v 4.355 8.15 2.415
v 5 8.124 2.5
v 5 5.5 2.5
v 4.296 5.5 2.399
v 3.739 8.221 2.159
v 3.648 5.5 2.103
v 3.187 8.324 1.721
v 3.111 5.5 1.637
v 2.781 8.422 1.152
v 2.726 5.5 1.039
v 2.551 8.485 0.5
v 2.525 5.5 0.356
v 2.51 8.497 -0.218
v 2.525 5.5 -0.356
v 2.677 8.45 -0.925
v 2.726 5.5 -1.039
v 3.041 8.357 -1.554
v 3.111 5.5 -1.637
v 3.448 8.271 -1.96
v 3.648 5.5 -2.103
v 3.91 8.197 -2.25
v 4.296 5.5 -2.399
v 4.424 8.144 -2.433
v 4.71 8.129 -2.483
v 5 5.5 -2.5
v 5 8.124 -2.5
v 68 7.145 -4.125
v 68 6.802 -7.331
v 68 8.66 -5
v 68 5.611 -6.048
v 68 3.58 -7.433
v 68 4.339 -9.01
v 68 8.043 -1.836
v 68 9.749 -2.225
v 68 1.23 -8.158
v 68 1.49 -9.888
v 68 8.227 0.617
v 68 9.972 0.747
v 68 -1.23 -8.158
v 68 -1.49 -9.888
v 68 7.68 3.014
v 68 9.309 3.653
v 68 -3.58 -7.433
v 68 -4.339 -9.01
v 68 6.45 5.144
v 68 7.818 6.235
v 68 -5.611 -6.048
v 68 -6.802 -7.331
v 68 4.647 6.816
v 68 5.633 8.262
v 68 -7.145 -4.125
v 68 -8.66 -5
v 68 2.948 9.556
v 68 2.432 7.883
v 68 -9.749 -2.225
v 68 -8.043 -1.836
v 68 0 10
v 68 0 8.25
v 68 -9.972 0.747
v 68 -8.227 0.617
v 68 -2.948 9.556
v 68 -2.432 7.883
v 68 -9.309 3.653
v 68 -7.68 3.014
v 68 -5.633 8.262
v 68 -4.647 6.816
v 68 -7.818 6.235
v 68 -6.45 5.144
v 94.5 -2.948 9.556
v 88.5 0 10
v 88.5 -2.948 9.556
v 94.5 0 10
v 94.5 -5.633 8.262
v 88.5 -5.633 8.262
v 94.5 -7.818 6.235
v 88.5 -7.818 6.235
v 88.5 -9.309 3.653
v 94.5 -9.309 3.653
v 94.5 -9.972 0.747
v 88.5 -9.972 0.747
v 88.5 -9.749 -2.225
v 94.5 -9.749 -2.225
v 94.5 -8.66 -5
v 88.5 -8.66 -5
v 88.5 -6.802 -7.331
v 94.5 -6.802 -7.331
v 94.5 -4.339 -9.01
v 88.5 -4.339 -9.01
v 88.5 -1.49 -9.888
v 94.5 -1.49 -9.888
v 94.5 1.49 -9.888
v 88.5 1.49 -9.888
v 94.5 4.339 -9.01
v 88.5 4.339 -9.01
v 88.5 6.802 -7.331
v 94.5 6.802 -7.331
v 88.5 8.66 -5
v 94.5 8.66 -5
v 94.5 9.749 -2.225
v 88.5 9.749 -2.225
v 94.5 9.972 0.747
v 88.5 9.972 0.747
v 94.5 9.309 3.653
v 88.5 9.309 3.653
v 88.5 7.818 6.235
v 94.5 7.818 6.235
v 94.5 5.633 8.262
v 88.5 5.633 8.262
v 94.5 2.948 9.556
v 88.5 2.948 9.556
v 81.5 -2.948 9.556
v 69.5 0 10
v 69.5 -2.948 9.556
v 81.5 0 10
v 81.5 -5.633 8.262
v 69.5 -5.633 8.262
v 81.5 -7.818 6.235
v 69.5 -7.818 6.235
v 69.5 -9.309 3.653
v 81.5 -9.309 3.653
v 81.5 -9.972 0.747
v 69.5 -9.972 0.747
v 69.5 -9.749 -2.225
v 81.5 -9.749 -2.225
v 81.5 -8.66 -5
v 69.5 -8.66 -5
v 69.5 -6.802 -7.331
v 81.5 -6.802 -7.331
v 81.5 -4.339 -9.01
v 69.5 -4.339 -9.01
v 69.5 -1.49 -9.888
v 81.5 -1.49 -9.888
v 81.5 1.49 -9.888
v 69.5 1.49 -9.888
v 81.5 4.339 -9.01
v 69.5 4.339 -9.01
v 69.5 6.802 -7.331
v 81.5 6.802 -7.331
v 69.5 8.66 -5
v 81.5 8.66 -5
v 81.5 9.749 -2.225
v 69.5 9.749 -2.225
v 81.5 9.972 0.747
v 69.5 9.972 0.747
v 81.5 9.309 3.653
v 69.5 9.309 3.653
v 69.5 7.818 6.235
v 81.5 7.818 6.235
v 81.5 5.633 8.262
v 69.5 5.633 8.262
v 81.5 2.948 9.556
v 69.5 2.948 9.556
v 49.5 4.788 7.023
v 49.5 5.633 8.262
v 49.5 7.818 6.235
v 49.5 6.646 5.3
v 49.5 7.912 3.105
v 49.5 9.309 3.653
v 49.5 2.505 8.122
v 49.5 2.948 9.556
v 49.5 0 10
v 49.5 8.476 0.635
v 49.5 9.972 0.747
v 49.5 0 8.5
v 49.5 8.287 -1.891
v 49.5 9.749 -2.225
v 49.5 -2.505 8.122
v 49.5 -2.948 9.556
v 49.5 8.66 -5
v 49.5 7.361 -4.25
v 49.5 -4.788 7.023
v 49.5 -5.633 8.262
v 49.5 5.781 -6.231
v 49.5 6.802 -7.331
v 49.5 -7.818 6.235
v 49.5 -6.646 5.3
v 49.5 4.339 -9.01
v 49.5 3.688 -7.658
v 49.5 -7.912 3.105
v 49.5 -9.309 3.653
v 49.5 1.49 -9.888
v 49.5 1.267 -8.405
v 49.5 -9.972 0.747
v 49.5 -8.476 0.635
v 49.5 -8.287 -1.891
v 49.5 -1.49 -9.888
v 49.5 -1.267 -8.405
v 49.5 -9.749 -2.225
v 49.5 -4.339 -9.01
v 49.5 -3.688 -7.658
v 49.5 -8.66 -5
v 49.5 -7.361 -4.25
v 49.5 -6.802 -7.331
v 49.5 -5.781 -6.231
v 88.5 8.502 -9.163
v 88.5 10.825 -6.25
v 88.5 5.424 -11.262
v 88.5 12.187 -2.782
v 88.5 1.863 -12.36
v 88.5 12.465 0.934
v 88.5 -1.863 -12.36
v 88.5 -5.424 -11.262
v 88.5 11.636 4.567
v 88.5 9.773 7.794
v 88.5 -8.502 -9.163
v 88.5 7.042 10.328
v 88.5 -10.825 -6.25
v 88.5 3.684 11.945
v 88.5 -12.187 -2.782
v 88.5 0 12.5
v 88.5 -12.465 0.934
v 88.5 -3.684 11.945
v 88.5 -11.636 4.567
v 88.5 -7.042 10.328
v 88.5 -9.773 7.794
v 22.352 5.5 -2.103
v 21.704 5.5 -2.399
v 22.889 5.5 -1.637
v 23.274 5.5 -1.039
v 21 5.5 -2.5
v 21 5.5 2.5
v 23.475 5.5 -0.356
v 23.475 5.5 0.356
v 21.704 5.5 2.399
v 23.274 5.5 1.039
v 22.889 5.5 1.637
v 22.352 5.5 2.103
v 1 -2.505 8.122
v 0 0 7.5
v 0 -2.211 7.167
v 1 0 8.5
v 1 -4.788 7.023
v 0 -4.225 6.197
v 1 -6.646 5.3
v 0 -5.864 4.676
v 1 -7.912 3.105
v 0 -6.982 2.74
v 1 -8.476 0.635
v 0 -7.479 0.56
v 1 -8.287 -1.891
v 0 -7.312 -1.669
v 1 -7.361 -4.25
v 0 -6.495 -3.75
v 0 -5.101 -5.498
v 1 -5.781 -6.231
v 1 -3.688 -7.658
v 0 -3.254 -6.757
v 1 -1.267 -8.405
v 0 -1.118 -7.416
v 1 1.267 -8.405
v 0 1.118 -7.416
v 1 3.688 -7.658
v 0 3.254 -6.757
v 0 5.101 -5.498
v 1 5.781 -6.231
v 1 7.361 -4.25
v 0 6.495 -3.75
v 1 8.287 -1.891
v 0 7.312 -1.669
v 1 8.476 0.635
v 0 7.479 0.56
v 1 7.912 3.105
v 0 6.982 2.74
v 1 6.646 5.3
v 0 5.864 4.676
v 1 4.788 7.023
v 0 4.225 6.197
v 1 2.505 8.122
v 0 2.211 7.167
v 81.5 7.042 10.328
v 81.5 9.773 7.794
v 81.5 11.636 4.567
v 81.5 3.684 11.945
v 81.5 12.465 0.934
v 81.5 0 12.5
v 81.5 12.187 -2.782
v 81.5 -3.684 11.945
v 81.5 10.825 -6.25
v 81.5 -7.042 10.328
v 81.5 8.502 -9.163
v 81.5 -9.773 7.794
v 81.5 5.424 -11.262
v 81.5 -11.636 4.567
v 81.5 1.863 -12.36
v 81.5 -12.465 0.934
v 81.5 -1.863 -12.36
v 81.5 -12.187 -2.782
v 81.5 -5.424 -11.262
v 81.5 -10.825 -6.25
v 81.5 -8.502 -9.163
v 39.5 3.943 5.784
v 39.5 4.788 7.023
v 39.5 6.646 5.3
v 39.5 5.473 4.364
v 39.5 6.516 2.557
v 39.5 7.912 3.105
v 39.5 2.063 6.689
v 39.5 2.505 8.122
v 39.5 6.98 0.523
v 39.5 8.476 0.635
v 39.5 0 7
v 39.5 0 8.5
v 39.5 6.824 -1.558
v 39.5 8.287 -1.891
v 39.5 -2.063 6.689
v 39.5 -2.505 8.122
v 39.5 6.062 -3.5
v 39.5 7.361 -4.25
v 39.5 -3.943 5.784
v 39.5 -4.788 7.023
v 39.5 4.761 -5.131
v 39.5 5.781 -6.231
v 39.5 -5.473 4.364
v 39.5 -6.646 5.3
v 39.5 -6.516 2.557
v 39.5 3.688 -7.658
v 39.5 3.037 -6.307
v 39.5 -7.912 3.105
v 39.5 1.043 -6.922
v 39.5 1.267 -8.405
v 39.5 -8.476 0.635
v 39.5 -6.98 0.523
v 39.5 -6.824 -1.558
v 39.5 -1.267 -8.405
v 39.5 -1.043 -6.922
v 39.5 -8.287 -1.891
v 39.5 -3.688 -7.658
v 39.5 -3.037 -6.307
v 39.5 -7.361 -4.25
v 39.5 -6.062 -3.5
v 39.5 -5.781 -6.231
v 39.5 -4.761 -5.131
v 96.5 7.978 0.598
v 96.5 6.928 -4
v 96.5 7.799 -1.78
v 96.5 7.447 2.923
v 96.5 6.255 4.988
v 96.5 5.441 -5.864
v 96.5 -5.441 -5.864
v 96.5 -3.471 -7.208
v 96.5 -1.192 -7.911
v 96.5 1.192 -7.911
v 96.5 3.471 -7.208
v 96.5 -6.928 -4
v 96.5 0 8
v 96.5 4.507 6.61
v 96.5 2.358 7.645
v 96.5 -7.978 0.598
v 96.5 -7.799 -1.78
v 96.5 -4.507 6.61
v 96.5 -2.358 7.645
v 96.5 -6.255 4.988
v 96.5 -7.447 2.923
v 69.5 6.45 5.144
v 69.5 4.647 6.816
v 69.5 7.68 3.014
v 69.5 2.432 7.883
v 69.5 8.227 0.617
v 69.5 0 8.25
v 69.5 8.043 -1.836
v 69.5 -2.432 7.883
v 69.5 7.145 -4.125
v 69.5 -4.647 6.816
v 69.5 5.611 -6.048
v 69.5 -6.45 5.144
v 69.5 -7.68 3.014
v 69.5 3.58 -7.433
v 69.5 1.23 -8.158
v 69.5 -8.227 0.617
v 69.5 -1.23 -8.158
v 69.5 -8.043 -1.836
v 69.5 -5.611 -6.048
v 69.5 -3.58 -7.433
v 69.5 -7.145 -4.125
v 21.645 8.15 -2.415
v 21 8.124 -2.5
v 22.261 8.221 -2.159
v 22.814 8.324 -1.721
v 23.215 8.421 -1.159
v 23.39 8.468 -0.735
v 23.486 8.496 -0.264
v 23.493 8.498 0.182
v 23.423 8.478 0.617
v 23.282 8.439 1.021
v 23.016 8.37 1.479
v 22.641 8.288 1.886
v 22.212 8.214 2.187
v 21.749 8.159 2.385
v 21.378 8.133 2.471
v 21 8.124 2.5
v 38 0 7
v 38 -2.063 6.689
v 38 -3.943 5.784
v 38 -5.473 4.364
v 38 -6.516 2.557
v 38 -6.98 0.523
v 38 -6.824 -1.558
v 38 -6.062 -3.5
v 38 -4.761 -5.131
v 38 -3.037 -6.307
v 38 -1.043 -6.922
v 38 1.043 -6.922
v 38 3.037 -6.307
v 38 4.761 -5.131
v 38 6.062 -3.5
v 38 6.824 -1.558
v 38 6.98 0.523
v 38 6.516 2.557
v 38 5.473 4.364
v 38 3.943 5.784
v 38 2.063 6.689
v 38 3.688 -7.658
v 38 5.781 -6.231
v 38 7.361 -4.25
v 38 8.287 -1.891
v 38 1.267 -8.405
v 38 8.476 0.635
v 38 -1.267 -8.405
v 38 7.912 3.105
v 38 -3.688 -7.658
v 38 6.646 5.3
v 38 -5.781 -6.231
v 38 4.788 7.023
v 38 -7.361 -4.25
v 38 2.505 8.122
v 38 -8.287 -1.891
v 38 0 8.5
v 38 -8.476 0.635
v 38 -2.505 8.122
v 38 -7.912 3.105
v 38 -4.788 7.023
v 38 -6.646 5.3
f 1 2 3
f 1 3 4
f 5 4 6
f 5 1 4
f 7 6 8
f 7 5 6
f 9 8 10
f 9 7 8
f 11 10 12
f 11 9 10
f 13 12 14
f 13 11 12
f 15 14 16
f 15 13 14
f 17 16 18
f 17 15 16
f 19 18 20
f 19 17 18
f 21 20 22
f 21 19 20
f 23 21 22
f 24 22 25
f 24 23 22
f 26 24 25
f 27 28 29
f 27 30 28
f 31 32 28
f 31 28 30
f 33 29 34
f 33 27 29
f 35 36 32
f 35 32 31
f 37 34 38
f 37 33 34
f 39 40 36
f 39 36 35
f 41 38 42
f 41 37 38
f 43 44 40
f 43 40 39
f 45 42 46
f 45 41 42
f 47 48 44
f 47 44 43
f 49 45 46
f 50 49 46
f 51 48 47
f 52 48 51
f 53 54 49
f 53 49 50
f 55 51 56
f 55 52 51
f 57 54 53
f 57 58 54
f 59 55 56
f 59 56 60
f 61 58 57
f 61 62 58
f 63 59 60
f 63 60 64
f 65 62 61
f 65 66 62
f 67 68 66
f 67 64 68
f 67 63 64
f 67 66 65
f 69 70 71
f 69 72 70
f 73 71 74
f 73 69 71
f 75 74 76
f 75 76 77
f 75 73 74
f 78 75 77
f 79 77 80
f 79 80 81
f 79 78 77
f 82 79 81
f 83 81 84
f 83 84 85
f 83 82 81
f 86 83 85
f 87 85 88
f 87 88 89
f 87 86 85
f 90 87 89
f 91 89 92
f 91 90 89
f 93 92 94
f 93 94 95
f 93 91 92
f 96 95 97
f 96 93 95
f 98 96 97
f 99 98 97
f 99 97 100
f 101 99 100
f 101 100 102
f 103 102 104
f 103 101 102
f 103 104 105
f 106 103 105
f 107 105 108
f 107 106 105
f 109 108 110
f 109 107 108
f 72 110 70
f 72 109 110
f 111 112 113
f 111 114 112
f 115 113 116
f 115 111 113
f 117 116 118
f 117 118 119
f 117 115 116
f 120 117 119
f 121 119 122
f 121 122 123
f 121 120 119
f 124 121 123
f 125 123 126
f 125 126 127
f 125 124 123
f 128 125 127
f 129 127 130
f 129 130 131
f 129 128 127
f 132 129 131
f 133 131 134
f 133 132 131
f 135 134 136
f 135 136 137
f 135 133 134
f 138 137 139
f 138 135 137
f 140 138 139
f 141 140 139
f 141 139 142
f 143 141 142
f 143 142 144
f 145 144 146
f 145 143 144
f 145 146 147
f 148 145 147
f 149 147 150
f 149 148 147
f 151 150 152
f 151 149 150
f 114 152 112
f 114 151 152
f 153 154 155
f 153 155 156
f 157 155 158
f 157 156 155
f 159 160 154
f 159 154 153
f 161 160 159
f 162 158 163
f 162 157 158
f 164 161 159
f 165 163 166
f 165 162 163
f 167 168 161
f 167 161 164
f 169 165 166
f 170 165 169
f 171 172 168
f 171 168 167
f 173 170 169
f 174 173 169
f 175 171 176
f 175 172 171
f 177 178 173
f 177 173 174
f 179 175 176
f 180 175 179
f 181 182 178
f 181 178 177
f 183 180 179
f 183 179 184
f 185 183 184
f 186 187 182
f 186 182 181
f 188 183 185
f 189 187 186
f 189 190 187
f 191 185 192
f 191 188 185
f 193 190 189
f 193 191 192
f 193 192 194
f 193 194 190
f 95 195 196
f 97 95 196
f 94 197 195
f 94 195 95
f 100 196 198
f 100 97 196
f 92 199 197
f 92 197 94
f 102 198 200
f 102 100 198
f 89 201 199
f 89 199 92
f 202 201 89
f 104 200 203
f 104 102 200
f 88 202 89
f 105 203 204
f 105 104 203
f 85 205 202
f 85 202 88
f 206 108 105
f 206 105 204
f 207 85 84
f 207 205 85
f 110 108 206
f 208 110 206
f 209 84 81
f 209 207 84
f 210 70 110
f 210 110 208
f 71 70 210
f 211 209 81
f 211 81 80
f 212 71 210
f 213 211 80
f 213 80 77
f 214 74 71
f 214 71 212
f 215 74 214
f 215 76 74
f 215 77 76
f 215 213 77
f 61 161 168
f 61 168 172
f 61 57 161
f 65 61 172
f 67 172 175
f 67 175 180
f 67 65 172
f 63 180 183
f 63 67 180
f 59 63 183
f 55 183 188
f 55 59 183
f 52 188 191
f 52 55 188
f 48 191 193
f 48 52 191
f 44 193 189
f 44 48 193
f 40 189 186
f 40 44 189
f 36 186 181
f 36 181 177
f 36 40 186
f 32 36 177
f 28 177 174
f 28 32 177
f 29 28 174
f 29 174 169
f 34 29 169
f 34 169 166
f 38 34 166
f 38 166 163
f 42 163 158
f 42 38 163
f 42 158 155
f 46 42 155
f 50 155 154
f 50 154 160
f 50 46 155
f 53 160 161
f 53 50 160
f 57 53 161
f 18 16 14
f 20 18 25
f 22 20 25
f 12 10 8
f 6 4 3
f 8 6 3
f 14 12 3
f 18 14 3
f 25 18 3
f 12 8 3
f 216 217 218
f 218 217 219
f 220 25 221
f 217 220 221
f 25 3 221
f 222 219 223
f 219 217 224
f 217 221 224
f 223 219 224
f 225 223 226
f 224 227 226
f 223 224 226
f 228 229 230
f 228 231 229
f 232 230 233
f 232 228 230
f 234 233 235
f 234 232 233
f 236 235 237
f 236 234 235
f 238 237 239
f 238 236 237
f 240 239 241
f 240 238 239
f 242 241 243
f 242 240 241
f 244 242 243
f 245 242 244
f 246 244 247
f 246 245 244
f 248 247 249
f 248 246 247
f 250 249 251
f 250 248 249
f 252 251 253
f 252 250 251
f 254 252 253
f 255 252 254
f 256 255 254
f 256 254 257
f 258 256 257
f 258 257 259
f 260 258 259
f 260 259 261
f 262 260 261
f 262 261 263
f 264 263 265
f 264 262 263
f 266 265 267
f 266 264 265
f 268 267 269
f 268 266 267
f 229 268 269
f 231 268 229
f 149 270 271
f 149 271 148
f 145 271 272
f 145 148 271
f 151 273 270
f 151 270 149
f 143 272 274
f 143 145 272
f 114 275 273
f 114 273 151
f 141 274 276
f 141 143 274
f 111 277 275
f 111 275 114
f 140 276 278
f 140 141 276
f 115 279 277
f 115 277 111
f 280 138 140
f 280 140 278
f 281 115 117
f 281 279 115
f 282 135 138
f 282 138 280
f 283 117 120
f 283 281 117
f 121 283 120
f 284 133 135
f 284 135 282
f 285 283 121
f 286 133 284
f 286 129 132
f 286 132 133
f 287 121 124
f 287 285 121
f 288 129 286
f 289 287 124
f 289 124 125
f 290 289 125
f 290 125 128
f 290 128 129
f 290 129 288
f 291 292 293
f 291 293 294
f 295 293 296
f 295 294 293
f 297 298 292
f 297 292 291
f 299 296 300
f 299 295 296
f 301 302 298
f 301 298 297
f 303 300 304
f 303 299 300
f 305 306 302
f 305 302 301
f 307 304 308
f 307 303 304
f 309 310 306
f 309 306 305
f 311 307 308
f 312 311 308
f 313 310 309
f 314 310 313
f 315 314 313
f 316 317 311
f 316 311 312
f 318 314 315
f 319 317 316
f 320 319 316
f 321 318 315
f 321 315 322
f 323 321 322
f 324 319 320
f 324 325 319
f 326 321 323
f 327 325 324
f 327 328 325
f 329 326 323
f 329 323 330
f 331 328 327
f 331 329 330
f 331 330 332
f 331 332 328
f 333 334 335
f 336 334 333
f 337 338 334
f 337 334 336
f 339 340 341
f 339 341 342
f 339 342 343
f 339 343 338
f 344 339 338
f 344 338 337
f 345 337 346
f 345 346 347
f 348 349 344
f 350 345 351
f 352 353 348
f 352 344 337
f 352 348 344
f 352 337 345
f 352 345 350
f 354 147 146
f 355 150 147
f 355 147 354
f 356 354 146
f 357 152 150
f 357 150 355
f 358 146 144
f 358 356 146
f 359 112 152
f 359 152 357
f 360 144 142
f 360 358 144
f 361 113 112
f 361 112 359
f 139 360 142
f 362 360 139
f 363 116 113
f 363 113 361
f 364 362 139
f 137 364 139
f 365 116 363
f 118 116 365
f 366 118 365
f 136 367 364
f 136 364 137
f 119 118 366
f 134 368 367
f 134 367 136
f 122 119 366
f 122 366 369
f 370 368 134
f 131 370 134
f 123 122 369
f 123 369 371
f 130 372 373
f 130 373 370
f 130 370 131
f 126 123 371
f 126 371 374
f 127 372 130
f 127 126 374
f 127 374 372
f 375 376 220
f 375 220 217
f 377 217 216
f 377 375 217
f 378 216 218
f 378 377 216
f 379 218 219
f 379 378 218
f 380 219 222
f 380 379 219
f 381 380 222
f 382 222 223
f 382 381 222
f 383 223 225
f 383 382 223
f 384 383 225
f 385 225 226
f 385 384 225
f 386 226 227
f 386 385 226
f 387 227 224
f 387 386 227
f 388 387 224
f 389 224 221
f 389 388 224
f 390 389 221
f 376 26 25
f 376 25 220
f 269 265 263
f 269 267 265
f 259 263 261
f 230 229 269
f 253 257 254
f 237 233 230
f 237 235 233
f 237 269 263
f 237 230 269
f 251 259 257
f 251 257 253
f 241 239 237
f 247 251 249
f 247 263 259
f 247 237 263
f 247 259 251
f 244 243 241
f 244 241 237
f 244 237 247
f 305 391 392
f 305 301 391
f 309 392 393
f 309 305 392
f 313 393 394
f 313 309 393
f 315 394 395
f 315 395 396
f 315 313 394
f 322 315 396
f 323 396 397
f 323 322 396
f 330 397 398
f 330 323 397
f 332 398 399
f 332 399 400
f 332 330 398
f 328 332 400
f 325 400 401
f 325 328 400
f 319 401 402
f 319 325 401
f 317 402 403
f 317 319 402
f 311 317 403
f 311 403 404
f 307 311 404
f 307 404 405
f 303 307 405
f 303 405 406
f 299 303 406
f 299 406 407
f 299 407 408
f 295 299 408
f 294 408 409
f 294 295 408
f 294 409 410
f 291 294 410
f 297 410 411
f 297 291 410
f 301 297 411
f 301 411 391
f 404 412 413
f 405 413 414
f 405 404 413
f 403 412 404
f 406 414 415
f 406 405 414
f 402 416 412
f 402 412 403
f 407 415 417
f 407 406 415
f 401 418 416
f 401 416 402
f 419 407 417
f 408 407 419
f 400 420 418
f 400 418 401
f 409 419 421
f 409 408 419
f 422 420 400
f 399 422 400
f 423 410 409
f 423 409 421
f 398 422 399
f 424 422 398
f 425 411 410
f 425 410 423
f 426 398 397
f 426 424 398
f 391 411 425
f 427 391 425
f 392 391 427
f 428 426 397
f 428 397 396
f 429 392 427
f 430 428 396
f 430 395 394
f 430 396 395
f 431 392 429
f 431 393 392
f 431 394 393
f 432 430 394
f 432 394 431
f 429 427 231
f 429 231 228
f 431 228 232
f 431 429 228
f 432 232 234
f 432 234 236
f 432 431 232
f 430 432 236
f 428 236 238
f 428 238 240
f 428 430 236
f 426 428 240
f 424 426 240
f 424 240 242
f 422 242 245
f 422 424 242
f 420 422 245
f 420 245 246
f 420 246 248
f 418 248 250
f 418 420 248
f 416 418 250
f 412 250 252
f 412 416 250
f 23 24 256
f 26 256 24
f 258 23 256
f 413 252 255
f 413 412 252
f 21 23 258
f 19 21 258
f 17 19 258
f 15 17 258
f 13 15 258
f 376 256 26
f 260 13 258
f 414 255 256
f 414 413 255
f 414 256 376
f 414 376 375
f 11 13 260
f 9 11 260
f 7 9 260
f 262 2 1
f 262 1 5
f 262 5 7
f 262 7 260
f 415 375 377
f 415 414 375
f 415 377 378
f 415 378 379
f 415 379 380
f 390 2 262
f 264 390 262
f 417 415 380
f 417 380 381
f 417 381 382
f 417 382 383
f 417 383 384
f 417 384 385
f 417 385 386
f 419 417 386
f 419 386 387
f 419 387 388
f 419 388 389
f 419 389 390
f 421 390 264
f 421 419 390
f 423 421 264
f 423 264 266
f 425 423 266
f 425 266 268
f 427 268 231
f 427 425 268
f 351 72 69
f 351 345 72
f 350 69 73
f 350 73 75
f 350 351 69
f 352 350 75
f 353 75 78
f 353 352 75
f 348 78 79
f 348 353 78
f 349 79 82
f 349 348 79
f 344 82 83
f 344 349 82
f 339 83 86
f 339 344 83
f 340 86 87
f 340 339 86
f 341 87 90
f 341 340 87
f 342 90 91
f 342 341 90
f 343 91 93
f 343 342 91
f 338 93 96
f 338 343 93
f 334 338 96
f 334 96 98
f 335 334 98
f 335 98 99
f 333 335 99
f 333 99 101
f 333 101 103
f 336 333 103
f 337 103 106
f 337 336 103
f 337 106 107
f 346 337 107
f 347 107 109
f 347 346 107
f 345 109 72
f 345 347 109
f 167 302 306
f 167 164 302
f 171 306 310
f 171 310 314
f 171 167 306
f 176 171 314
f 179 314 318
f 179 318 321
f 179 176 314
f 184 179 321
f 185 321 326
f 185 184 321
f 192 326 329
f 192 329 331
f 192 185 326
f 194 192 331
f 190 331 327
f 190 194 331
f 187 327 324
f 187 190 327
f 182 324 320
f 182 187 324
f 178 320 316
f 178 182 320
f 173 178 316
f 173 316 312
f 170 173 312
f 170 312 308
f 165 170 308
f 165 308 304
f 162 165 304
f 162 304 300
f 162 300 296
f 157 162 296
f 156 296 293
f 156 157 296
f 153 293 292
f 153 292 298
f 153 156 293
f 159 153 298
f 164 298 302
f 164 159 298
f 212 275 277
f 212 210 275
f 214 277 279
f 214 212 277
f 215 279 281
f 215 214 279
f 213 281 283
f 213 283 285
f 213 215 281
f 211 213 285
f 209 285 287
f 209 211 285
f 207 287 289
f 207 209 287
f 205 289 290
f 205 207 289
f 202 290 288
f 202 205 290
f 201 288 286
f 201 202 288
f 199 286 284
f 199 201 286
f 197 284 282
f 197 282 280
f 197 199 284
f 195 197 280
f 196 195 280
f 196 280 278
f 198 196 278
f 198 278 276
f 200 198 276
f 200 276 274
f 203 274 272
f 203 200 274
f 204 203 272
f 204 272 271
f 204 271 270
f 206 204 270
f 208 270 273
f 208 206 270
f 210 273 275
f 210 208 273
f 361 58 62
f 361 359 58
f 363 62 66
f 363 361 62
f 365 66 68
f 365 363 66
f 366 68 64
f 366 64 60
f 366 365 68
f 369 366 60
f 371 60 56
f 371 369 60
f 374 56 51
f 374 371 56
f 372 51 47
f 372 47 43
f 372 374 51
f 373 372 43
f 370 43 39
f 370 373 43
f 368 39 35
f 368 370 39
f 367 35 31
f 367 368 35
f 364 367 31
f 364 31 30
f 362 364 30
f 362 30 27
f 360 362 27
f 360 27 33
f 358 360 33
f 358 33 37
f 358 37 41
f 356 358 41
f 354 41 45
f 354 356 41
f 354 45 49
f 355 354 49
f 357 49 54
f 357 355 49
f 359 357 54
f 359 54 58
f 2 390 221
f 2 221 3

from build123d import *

# Parameters (mm, degrees)
ENL_V_MAT_EXTRU_1_DEPTH = 4.5


with BuildPart() as part:
    # Esquisse1 → Base-Révolution (revolve)
    with BuildSketch(Plane.XY, mode=Mode.PRIVATE) as base_r_volution_sk:
        Polygon((0, 0), (0, 7.5), (1, 8.5), (38, 8.5), (38, 7), (39.5, 7), (39.5, 8.5), (49.5, 8.5), (49.5, 10), (68, 10), (68, 8.25), (69.5, 8.25), (69.5, 10), (81.5, 10), (81.5, 12.5), (88.5, 12.5), (88.5, 10), (94.5, 10), (96.5, 8), (96.5, 0), align=None)
    revolve(base_r_volution_sk.sketch.rotate(Axis((0, 0, 0), (1, 0, 0)), 90), axis=Axis((0, 0, 0), (1, 0, 0)))

    # Esquisse2 → Enlèv. mat.-Extru.1 (cut)
    with BuildSketch(Plane(origin=(0, 10, 0), x_dir=(-1, 0, 0), z_dir=(0, 1, 0))):
        with BuildLine():
            Line((-21, 2.5), (-5, 2.5))
            ThreePointArc((-5, 2.5), (-2.5, 0), (-5, -2.5))
            Line((-5, -2.5), (-21, -2.5))
            ThreePointArc((-21, -2.5), (-23.5, 0), (-21, 2.5))
        make_face()
    extrude(amount=-ENL_V_MAT_EXTRU_1_DEPTH, mode=Mode.SUBTRACT)


solid = part.part
